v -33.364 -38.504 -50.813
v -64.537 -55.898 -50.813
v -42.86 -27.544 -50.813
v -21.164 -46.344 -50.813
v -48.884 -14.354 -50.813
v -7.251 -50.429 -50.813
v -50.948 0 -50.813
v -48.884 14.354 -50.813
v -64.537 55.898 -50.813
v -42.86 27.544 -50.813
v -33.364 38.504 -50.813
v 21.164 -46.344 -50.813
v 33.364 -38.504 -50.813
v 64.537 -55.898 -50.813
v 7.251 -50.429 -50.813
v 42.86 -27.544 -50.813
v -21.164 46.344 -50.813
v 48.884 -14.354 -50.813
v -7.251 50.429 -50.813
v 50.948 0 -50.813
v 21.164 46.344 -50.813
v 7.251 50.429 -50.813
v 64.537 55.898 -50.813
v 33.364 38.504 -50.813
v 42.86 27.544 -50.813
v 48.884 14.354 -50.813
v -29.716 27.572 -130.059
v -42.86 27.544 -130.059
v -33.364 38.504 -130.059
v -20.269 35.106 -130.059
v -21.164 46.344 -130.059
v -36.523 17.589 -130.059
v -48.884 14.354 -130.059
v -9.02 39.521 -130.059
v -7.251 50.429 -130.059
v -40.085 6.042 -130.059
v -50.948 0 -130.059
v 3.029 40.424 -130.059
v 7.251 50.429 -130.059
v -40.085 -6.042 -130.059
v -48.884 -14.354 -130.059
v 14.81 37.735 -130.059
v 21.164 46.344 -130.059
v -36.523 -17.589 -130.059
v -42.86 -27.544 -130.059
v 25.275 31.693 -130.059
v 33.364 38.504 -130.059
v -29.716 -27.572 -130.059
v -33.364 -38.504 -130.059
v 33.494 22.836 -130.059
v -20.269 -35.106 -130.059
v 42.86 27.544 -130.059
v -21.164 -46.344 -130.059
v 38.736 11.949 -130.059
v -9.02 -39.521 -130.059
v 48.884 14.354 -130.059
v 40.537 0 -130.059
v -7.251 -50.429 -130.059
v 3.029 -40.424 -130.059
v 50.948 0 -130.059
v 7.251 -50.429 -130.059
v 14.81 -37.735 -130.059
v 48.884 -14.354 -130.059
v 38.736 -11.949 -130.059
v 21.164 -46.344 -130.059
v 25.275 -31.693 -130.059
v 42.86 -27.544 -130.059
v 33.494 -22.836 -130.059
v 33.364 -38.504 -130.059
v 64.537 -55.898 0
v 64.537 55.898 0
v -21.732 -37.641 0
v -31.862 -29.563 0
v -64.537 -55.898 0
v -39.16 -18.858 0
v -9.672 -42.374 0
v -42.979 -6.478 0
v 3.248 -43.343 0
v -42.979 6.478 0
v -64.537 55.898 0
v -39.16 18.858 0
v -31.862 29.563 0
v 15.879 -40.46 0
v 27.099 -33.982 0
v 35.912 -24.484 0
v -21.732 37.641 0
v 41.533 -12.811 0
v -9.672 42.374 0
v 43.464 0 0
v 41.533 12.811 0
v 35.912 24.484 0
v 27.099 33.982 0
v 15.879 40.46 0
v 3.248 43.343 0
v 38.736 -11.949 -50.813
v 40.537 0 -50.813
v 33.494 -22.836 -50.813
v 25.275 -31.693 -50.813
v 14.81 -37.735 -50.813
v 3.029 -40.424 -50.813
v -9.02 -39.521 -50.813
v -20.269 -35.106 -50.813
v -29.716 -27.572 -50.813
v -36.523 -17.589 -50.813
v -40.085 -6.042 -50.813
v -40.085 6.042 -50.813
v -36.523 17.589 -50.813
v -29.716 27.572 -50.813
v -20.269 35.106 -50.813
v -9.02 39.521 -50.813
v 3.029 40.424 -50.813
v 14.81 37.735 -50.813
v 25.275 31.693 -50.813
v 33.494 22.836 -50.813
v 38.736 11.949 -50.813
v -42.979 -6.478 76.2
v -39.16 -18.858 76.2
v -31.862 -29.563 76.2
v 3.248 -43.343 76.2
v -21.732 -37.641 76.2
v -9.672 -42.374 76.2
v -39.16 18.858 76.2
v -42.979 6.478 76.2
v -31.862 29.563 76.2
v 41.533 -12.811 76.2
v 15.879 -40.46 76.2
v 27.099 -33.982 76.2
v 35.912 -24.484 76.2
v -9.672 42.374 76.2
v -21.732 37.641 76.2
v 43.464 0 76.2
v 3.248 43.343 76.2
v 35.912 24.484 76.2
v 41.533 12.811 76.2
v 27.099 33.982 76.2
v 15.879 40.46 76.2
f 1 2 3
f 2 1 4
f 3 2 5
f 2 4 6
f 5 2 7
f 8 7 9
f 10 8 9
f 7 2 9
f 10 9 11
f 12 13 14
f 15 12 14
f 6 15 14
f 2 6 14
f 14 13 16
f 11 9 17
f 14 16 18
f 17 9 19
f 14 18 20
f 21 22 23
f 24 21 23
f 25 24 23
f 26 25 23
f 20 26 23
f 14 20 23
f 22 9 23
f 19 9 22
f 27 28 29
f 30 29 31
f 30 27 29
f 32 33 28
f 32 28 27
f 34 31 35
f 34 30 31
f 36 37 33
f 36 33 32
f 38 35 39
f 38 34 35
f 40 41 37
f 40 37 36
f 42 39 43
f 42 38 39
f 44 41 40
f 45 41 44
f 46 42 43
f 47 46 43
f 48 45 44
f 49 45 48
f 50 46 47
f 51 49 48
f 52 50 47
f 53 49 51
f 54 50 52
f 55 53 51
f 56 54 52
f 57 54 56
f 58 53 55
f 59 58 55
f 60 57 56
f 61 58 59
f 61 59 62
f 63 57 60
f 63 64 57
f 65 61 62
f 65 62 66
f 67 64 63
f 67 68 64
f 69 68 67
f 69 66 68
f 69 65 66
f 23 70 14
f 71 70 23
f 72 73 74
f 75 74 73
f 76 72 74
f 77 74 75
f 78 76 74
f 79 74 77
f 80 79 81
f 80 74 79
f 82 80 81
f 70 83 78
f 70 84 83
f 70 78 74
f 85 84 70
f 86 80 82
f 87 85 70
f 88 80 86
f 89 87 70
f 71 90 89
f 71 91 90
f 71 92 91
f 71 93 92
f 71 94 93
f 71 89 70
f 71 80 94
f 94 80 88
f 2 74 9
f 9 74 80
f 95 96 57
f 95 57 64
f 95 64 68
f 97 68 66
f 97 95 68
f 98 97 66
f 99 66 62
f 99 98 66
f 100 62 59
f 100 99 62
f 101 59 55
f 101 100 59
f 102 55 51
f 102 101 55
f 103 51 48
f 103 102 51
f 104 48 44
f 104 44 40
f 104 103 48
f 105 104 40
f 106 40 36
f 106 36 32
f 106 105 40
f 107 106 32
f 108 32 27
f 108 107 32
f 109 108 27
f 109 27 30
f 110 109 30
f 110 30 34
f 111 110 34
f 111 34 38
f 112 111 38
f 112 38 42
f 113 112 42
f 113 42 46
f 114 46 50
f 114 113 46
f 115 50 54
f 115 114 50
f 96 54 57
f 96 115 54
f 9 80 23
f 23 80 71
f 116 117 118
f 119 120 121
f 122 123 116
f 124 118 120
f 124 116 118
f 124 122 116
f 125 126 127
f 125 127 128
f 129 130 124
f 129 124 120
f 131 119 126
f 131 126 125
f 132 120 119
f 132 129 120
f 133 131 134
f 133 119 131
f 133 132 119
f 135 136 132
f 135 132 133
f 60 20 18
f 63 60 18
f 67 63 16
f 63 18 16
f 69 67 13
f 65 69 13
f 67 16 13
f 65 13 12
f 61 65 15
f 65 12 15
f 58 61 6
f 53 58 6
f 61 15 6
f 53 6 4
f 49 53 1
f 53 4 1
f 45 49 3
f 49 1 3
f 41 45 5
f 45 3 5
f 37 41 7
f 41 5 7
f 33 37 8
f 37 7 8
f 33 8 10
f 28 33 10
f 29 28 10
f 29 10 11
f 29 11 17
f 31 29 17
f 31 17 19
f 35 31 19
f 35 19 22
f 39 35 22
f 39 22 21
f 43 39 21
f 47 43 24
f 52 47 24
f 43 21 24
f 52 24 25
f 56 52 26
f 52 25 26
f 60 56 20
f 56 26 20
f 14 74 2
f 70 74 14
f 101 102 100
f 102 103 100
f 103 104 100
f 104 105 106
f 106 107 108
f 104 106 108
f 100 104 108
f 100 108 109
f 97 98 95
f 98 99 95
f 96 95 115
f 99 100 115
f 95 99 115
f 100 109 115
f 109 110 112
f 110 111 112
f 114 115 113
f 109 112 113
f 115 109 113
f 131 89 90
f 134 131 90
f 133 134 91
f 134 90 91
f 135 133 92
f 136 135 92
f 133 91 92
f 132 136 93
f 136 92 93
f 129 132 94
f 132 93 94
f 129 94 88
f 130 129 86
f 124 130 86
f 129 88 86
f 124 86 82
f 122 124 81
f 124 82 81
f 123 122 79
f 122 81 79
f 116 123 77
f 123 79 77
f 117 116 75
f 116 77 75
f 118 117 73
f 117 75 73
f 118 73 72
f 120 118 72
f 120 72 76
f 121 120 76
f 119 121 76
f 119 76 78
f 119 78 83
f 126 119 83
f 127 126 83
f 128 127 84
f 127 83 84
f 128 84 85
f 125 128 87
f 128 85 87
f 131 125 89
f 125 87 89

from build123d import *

# Parameters (mm, degrees)
F0_W     = 129.07374
F0_H     = 111.796118
F1_DEPTH = 50.813455
F2_R     = 43.46422
F3_DEPTH = 76.2
F4_R     = 50.947819
F4_R_2   = 40.53744
F5_DEPTH = 79.245634


with BuildPart() as f1:
    # F0 (on Top) → F1 (new body)
    with BuildSketch(Plane.XY):
        Rectangle(F0_W, F0_H)
    extrude(amount=-F1_DEPTH)

    # F2 (on face) → F3 (join)
    with BuildSketch(Plane.XY):
        Circle(F2_R)
    extrude(amount=F3_DEPTH)

    # F4 (on face) → F5 (join)
    with BuildSketch(Plane(origin=(0, 0, -50.813455), x_dir=(1, 0, 0), z_dir=(0, 0, -1))):
        Circle(F4_R)
        Circle(F4_R_2, mode=Mode.SUBTRACT)
    extrude(amount=F5_DEPTH)


solid = f1.part
